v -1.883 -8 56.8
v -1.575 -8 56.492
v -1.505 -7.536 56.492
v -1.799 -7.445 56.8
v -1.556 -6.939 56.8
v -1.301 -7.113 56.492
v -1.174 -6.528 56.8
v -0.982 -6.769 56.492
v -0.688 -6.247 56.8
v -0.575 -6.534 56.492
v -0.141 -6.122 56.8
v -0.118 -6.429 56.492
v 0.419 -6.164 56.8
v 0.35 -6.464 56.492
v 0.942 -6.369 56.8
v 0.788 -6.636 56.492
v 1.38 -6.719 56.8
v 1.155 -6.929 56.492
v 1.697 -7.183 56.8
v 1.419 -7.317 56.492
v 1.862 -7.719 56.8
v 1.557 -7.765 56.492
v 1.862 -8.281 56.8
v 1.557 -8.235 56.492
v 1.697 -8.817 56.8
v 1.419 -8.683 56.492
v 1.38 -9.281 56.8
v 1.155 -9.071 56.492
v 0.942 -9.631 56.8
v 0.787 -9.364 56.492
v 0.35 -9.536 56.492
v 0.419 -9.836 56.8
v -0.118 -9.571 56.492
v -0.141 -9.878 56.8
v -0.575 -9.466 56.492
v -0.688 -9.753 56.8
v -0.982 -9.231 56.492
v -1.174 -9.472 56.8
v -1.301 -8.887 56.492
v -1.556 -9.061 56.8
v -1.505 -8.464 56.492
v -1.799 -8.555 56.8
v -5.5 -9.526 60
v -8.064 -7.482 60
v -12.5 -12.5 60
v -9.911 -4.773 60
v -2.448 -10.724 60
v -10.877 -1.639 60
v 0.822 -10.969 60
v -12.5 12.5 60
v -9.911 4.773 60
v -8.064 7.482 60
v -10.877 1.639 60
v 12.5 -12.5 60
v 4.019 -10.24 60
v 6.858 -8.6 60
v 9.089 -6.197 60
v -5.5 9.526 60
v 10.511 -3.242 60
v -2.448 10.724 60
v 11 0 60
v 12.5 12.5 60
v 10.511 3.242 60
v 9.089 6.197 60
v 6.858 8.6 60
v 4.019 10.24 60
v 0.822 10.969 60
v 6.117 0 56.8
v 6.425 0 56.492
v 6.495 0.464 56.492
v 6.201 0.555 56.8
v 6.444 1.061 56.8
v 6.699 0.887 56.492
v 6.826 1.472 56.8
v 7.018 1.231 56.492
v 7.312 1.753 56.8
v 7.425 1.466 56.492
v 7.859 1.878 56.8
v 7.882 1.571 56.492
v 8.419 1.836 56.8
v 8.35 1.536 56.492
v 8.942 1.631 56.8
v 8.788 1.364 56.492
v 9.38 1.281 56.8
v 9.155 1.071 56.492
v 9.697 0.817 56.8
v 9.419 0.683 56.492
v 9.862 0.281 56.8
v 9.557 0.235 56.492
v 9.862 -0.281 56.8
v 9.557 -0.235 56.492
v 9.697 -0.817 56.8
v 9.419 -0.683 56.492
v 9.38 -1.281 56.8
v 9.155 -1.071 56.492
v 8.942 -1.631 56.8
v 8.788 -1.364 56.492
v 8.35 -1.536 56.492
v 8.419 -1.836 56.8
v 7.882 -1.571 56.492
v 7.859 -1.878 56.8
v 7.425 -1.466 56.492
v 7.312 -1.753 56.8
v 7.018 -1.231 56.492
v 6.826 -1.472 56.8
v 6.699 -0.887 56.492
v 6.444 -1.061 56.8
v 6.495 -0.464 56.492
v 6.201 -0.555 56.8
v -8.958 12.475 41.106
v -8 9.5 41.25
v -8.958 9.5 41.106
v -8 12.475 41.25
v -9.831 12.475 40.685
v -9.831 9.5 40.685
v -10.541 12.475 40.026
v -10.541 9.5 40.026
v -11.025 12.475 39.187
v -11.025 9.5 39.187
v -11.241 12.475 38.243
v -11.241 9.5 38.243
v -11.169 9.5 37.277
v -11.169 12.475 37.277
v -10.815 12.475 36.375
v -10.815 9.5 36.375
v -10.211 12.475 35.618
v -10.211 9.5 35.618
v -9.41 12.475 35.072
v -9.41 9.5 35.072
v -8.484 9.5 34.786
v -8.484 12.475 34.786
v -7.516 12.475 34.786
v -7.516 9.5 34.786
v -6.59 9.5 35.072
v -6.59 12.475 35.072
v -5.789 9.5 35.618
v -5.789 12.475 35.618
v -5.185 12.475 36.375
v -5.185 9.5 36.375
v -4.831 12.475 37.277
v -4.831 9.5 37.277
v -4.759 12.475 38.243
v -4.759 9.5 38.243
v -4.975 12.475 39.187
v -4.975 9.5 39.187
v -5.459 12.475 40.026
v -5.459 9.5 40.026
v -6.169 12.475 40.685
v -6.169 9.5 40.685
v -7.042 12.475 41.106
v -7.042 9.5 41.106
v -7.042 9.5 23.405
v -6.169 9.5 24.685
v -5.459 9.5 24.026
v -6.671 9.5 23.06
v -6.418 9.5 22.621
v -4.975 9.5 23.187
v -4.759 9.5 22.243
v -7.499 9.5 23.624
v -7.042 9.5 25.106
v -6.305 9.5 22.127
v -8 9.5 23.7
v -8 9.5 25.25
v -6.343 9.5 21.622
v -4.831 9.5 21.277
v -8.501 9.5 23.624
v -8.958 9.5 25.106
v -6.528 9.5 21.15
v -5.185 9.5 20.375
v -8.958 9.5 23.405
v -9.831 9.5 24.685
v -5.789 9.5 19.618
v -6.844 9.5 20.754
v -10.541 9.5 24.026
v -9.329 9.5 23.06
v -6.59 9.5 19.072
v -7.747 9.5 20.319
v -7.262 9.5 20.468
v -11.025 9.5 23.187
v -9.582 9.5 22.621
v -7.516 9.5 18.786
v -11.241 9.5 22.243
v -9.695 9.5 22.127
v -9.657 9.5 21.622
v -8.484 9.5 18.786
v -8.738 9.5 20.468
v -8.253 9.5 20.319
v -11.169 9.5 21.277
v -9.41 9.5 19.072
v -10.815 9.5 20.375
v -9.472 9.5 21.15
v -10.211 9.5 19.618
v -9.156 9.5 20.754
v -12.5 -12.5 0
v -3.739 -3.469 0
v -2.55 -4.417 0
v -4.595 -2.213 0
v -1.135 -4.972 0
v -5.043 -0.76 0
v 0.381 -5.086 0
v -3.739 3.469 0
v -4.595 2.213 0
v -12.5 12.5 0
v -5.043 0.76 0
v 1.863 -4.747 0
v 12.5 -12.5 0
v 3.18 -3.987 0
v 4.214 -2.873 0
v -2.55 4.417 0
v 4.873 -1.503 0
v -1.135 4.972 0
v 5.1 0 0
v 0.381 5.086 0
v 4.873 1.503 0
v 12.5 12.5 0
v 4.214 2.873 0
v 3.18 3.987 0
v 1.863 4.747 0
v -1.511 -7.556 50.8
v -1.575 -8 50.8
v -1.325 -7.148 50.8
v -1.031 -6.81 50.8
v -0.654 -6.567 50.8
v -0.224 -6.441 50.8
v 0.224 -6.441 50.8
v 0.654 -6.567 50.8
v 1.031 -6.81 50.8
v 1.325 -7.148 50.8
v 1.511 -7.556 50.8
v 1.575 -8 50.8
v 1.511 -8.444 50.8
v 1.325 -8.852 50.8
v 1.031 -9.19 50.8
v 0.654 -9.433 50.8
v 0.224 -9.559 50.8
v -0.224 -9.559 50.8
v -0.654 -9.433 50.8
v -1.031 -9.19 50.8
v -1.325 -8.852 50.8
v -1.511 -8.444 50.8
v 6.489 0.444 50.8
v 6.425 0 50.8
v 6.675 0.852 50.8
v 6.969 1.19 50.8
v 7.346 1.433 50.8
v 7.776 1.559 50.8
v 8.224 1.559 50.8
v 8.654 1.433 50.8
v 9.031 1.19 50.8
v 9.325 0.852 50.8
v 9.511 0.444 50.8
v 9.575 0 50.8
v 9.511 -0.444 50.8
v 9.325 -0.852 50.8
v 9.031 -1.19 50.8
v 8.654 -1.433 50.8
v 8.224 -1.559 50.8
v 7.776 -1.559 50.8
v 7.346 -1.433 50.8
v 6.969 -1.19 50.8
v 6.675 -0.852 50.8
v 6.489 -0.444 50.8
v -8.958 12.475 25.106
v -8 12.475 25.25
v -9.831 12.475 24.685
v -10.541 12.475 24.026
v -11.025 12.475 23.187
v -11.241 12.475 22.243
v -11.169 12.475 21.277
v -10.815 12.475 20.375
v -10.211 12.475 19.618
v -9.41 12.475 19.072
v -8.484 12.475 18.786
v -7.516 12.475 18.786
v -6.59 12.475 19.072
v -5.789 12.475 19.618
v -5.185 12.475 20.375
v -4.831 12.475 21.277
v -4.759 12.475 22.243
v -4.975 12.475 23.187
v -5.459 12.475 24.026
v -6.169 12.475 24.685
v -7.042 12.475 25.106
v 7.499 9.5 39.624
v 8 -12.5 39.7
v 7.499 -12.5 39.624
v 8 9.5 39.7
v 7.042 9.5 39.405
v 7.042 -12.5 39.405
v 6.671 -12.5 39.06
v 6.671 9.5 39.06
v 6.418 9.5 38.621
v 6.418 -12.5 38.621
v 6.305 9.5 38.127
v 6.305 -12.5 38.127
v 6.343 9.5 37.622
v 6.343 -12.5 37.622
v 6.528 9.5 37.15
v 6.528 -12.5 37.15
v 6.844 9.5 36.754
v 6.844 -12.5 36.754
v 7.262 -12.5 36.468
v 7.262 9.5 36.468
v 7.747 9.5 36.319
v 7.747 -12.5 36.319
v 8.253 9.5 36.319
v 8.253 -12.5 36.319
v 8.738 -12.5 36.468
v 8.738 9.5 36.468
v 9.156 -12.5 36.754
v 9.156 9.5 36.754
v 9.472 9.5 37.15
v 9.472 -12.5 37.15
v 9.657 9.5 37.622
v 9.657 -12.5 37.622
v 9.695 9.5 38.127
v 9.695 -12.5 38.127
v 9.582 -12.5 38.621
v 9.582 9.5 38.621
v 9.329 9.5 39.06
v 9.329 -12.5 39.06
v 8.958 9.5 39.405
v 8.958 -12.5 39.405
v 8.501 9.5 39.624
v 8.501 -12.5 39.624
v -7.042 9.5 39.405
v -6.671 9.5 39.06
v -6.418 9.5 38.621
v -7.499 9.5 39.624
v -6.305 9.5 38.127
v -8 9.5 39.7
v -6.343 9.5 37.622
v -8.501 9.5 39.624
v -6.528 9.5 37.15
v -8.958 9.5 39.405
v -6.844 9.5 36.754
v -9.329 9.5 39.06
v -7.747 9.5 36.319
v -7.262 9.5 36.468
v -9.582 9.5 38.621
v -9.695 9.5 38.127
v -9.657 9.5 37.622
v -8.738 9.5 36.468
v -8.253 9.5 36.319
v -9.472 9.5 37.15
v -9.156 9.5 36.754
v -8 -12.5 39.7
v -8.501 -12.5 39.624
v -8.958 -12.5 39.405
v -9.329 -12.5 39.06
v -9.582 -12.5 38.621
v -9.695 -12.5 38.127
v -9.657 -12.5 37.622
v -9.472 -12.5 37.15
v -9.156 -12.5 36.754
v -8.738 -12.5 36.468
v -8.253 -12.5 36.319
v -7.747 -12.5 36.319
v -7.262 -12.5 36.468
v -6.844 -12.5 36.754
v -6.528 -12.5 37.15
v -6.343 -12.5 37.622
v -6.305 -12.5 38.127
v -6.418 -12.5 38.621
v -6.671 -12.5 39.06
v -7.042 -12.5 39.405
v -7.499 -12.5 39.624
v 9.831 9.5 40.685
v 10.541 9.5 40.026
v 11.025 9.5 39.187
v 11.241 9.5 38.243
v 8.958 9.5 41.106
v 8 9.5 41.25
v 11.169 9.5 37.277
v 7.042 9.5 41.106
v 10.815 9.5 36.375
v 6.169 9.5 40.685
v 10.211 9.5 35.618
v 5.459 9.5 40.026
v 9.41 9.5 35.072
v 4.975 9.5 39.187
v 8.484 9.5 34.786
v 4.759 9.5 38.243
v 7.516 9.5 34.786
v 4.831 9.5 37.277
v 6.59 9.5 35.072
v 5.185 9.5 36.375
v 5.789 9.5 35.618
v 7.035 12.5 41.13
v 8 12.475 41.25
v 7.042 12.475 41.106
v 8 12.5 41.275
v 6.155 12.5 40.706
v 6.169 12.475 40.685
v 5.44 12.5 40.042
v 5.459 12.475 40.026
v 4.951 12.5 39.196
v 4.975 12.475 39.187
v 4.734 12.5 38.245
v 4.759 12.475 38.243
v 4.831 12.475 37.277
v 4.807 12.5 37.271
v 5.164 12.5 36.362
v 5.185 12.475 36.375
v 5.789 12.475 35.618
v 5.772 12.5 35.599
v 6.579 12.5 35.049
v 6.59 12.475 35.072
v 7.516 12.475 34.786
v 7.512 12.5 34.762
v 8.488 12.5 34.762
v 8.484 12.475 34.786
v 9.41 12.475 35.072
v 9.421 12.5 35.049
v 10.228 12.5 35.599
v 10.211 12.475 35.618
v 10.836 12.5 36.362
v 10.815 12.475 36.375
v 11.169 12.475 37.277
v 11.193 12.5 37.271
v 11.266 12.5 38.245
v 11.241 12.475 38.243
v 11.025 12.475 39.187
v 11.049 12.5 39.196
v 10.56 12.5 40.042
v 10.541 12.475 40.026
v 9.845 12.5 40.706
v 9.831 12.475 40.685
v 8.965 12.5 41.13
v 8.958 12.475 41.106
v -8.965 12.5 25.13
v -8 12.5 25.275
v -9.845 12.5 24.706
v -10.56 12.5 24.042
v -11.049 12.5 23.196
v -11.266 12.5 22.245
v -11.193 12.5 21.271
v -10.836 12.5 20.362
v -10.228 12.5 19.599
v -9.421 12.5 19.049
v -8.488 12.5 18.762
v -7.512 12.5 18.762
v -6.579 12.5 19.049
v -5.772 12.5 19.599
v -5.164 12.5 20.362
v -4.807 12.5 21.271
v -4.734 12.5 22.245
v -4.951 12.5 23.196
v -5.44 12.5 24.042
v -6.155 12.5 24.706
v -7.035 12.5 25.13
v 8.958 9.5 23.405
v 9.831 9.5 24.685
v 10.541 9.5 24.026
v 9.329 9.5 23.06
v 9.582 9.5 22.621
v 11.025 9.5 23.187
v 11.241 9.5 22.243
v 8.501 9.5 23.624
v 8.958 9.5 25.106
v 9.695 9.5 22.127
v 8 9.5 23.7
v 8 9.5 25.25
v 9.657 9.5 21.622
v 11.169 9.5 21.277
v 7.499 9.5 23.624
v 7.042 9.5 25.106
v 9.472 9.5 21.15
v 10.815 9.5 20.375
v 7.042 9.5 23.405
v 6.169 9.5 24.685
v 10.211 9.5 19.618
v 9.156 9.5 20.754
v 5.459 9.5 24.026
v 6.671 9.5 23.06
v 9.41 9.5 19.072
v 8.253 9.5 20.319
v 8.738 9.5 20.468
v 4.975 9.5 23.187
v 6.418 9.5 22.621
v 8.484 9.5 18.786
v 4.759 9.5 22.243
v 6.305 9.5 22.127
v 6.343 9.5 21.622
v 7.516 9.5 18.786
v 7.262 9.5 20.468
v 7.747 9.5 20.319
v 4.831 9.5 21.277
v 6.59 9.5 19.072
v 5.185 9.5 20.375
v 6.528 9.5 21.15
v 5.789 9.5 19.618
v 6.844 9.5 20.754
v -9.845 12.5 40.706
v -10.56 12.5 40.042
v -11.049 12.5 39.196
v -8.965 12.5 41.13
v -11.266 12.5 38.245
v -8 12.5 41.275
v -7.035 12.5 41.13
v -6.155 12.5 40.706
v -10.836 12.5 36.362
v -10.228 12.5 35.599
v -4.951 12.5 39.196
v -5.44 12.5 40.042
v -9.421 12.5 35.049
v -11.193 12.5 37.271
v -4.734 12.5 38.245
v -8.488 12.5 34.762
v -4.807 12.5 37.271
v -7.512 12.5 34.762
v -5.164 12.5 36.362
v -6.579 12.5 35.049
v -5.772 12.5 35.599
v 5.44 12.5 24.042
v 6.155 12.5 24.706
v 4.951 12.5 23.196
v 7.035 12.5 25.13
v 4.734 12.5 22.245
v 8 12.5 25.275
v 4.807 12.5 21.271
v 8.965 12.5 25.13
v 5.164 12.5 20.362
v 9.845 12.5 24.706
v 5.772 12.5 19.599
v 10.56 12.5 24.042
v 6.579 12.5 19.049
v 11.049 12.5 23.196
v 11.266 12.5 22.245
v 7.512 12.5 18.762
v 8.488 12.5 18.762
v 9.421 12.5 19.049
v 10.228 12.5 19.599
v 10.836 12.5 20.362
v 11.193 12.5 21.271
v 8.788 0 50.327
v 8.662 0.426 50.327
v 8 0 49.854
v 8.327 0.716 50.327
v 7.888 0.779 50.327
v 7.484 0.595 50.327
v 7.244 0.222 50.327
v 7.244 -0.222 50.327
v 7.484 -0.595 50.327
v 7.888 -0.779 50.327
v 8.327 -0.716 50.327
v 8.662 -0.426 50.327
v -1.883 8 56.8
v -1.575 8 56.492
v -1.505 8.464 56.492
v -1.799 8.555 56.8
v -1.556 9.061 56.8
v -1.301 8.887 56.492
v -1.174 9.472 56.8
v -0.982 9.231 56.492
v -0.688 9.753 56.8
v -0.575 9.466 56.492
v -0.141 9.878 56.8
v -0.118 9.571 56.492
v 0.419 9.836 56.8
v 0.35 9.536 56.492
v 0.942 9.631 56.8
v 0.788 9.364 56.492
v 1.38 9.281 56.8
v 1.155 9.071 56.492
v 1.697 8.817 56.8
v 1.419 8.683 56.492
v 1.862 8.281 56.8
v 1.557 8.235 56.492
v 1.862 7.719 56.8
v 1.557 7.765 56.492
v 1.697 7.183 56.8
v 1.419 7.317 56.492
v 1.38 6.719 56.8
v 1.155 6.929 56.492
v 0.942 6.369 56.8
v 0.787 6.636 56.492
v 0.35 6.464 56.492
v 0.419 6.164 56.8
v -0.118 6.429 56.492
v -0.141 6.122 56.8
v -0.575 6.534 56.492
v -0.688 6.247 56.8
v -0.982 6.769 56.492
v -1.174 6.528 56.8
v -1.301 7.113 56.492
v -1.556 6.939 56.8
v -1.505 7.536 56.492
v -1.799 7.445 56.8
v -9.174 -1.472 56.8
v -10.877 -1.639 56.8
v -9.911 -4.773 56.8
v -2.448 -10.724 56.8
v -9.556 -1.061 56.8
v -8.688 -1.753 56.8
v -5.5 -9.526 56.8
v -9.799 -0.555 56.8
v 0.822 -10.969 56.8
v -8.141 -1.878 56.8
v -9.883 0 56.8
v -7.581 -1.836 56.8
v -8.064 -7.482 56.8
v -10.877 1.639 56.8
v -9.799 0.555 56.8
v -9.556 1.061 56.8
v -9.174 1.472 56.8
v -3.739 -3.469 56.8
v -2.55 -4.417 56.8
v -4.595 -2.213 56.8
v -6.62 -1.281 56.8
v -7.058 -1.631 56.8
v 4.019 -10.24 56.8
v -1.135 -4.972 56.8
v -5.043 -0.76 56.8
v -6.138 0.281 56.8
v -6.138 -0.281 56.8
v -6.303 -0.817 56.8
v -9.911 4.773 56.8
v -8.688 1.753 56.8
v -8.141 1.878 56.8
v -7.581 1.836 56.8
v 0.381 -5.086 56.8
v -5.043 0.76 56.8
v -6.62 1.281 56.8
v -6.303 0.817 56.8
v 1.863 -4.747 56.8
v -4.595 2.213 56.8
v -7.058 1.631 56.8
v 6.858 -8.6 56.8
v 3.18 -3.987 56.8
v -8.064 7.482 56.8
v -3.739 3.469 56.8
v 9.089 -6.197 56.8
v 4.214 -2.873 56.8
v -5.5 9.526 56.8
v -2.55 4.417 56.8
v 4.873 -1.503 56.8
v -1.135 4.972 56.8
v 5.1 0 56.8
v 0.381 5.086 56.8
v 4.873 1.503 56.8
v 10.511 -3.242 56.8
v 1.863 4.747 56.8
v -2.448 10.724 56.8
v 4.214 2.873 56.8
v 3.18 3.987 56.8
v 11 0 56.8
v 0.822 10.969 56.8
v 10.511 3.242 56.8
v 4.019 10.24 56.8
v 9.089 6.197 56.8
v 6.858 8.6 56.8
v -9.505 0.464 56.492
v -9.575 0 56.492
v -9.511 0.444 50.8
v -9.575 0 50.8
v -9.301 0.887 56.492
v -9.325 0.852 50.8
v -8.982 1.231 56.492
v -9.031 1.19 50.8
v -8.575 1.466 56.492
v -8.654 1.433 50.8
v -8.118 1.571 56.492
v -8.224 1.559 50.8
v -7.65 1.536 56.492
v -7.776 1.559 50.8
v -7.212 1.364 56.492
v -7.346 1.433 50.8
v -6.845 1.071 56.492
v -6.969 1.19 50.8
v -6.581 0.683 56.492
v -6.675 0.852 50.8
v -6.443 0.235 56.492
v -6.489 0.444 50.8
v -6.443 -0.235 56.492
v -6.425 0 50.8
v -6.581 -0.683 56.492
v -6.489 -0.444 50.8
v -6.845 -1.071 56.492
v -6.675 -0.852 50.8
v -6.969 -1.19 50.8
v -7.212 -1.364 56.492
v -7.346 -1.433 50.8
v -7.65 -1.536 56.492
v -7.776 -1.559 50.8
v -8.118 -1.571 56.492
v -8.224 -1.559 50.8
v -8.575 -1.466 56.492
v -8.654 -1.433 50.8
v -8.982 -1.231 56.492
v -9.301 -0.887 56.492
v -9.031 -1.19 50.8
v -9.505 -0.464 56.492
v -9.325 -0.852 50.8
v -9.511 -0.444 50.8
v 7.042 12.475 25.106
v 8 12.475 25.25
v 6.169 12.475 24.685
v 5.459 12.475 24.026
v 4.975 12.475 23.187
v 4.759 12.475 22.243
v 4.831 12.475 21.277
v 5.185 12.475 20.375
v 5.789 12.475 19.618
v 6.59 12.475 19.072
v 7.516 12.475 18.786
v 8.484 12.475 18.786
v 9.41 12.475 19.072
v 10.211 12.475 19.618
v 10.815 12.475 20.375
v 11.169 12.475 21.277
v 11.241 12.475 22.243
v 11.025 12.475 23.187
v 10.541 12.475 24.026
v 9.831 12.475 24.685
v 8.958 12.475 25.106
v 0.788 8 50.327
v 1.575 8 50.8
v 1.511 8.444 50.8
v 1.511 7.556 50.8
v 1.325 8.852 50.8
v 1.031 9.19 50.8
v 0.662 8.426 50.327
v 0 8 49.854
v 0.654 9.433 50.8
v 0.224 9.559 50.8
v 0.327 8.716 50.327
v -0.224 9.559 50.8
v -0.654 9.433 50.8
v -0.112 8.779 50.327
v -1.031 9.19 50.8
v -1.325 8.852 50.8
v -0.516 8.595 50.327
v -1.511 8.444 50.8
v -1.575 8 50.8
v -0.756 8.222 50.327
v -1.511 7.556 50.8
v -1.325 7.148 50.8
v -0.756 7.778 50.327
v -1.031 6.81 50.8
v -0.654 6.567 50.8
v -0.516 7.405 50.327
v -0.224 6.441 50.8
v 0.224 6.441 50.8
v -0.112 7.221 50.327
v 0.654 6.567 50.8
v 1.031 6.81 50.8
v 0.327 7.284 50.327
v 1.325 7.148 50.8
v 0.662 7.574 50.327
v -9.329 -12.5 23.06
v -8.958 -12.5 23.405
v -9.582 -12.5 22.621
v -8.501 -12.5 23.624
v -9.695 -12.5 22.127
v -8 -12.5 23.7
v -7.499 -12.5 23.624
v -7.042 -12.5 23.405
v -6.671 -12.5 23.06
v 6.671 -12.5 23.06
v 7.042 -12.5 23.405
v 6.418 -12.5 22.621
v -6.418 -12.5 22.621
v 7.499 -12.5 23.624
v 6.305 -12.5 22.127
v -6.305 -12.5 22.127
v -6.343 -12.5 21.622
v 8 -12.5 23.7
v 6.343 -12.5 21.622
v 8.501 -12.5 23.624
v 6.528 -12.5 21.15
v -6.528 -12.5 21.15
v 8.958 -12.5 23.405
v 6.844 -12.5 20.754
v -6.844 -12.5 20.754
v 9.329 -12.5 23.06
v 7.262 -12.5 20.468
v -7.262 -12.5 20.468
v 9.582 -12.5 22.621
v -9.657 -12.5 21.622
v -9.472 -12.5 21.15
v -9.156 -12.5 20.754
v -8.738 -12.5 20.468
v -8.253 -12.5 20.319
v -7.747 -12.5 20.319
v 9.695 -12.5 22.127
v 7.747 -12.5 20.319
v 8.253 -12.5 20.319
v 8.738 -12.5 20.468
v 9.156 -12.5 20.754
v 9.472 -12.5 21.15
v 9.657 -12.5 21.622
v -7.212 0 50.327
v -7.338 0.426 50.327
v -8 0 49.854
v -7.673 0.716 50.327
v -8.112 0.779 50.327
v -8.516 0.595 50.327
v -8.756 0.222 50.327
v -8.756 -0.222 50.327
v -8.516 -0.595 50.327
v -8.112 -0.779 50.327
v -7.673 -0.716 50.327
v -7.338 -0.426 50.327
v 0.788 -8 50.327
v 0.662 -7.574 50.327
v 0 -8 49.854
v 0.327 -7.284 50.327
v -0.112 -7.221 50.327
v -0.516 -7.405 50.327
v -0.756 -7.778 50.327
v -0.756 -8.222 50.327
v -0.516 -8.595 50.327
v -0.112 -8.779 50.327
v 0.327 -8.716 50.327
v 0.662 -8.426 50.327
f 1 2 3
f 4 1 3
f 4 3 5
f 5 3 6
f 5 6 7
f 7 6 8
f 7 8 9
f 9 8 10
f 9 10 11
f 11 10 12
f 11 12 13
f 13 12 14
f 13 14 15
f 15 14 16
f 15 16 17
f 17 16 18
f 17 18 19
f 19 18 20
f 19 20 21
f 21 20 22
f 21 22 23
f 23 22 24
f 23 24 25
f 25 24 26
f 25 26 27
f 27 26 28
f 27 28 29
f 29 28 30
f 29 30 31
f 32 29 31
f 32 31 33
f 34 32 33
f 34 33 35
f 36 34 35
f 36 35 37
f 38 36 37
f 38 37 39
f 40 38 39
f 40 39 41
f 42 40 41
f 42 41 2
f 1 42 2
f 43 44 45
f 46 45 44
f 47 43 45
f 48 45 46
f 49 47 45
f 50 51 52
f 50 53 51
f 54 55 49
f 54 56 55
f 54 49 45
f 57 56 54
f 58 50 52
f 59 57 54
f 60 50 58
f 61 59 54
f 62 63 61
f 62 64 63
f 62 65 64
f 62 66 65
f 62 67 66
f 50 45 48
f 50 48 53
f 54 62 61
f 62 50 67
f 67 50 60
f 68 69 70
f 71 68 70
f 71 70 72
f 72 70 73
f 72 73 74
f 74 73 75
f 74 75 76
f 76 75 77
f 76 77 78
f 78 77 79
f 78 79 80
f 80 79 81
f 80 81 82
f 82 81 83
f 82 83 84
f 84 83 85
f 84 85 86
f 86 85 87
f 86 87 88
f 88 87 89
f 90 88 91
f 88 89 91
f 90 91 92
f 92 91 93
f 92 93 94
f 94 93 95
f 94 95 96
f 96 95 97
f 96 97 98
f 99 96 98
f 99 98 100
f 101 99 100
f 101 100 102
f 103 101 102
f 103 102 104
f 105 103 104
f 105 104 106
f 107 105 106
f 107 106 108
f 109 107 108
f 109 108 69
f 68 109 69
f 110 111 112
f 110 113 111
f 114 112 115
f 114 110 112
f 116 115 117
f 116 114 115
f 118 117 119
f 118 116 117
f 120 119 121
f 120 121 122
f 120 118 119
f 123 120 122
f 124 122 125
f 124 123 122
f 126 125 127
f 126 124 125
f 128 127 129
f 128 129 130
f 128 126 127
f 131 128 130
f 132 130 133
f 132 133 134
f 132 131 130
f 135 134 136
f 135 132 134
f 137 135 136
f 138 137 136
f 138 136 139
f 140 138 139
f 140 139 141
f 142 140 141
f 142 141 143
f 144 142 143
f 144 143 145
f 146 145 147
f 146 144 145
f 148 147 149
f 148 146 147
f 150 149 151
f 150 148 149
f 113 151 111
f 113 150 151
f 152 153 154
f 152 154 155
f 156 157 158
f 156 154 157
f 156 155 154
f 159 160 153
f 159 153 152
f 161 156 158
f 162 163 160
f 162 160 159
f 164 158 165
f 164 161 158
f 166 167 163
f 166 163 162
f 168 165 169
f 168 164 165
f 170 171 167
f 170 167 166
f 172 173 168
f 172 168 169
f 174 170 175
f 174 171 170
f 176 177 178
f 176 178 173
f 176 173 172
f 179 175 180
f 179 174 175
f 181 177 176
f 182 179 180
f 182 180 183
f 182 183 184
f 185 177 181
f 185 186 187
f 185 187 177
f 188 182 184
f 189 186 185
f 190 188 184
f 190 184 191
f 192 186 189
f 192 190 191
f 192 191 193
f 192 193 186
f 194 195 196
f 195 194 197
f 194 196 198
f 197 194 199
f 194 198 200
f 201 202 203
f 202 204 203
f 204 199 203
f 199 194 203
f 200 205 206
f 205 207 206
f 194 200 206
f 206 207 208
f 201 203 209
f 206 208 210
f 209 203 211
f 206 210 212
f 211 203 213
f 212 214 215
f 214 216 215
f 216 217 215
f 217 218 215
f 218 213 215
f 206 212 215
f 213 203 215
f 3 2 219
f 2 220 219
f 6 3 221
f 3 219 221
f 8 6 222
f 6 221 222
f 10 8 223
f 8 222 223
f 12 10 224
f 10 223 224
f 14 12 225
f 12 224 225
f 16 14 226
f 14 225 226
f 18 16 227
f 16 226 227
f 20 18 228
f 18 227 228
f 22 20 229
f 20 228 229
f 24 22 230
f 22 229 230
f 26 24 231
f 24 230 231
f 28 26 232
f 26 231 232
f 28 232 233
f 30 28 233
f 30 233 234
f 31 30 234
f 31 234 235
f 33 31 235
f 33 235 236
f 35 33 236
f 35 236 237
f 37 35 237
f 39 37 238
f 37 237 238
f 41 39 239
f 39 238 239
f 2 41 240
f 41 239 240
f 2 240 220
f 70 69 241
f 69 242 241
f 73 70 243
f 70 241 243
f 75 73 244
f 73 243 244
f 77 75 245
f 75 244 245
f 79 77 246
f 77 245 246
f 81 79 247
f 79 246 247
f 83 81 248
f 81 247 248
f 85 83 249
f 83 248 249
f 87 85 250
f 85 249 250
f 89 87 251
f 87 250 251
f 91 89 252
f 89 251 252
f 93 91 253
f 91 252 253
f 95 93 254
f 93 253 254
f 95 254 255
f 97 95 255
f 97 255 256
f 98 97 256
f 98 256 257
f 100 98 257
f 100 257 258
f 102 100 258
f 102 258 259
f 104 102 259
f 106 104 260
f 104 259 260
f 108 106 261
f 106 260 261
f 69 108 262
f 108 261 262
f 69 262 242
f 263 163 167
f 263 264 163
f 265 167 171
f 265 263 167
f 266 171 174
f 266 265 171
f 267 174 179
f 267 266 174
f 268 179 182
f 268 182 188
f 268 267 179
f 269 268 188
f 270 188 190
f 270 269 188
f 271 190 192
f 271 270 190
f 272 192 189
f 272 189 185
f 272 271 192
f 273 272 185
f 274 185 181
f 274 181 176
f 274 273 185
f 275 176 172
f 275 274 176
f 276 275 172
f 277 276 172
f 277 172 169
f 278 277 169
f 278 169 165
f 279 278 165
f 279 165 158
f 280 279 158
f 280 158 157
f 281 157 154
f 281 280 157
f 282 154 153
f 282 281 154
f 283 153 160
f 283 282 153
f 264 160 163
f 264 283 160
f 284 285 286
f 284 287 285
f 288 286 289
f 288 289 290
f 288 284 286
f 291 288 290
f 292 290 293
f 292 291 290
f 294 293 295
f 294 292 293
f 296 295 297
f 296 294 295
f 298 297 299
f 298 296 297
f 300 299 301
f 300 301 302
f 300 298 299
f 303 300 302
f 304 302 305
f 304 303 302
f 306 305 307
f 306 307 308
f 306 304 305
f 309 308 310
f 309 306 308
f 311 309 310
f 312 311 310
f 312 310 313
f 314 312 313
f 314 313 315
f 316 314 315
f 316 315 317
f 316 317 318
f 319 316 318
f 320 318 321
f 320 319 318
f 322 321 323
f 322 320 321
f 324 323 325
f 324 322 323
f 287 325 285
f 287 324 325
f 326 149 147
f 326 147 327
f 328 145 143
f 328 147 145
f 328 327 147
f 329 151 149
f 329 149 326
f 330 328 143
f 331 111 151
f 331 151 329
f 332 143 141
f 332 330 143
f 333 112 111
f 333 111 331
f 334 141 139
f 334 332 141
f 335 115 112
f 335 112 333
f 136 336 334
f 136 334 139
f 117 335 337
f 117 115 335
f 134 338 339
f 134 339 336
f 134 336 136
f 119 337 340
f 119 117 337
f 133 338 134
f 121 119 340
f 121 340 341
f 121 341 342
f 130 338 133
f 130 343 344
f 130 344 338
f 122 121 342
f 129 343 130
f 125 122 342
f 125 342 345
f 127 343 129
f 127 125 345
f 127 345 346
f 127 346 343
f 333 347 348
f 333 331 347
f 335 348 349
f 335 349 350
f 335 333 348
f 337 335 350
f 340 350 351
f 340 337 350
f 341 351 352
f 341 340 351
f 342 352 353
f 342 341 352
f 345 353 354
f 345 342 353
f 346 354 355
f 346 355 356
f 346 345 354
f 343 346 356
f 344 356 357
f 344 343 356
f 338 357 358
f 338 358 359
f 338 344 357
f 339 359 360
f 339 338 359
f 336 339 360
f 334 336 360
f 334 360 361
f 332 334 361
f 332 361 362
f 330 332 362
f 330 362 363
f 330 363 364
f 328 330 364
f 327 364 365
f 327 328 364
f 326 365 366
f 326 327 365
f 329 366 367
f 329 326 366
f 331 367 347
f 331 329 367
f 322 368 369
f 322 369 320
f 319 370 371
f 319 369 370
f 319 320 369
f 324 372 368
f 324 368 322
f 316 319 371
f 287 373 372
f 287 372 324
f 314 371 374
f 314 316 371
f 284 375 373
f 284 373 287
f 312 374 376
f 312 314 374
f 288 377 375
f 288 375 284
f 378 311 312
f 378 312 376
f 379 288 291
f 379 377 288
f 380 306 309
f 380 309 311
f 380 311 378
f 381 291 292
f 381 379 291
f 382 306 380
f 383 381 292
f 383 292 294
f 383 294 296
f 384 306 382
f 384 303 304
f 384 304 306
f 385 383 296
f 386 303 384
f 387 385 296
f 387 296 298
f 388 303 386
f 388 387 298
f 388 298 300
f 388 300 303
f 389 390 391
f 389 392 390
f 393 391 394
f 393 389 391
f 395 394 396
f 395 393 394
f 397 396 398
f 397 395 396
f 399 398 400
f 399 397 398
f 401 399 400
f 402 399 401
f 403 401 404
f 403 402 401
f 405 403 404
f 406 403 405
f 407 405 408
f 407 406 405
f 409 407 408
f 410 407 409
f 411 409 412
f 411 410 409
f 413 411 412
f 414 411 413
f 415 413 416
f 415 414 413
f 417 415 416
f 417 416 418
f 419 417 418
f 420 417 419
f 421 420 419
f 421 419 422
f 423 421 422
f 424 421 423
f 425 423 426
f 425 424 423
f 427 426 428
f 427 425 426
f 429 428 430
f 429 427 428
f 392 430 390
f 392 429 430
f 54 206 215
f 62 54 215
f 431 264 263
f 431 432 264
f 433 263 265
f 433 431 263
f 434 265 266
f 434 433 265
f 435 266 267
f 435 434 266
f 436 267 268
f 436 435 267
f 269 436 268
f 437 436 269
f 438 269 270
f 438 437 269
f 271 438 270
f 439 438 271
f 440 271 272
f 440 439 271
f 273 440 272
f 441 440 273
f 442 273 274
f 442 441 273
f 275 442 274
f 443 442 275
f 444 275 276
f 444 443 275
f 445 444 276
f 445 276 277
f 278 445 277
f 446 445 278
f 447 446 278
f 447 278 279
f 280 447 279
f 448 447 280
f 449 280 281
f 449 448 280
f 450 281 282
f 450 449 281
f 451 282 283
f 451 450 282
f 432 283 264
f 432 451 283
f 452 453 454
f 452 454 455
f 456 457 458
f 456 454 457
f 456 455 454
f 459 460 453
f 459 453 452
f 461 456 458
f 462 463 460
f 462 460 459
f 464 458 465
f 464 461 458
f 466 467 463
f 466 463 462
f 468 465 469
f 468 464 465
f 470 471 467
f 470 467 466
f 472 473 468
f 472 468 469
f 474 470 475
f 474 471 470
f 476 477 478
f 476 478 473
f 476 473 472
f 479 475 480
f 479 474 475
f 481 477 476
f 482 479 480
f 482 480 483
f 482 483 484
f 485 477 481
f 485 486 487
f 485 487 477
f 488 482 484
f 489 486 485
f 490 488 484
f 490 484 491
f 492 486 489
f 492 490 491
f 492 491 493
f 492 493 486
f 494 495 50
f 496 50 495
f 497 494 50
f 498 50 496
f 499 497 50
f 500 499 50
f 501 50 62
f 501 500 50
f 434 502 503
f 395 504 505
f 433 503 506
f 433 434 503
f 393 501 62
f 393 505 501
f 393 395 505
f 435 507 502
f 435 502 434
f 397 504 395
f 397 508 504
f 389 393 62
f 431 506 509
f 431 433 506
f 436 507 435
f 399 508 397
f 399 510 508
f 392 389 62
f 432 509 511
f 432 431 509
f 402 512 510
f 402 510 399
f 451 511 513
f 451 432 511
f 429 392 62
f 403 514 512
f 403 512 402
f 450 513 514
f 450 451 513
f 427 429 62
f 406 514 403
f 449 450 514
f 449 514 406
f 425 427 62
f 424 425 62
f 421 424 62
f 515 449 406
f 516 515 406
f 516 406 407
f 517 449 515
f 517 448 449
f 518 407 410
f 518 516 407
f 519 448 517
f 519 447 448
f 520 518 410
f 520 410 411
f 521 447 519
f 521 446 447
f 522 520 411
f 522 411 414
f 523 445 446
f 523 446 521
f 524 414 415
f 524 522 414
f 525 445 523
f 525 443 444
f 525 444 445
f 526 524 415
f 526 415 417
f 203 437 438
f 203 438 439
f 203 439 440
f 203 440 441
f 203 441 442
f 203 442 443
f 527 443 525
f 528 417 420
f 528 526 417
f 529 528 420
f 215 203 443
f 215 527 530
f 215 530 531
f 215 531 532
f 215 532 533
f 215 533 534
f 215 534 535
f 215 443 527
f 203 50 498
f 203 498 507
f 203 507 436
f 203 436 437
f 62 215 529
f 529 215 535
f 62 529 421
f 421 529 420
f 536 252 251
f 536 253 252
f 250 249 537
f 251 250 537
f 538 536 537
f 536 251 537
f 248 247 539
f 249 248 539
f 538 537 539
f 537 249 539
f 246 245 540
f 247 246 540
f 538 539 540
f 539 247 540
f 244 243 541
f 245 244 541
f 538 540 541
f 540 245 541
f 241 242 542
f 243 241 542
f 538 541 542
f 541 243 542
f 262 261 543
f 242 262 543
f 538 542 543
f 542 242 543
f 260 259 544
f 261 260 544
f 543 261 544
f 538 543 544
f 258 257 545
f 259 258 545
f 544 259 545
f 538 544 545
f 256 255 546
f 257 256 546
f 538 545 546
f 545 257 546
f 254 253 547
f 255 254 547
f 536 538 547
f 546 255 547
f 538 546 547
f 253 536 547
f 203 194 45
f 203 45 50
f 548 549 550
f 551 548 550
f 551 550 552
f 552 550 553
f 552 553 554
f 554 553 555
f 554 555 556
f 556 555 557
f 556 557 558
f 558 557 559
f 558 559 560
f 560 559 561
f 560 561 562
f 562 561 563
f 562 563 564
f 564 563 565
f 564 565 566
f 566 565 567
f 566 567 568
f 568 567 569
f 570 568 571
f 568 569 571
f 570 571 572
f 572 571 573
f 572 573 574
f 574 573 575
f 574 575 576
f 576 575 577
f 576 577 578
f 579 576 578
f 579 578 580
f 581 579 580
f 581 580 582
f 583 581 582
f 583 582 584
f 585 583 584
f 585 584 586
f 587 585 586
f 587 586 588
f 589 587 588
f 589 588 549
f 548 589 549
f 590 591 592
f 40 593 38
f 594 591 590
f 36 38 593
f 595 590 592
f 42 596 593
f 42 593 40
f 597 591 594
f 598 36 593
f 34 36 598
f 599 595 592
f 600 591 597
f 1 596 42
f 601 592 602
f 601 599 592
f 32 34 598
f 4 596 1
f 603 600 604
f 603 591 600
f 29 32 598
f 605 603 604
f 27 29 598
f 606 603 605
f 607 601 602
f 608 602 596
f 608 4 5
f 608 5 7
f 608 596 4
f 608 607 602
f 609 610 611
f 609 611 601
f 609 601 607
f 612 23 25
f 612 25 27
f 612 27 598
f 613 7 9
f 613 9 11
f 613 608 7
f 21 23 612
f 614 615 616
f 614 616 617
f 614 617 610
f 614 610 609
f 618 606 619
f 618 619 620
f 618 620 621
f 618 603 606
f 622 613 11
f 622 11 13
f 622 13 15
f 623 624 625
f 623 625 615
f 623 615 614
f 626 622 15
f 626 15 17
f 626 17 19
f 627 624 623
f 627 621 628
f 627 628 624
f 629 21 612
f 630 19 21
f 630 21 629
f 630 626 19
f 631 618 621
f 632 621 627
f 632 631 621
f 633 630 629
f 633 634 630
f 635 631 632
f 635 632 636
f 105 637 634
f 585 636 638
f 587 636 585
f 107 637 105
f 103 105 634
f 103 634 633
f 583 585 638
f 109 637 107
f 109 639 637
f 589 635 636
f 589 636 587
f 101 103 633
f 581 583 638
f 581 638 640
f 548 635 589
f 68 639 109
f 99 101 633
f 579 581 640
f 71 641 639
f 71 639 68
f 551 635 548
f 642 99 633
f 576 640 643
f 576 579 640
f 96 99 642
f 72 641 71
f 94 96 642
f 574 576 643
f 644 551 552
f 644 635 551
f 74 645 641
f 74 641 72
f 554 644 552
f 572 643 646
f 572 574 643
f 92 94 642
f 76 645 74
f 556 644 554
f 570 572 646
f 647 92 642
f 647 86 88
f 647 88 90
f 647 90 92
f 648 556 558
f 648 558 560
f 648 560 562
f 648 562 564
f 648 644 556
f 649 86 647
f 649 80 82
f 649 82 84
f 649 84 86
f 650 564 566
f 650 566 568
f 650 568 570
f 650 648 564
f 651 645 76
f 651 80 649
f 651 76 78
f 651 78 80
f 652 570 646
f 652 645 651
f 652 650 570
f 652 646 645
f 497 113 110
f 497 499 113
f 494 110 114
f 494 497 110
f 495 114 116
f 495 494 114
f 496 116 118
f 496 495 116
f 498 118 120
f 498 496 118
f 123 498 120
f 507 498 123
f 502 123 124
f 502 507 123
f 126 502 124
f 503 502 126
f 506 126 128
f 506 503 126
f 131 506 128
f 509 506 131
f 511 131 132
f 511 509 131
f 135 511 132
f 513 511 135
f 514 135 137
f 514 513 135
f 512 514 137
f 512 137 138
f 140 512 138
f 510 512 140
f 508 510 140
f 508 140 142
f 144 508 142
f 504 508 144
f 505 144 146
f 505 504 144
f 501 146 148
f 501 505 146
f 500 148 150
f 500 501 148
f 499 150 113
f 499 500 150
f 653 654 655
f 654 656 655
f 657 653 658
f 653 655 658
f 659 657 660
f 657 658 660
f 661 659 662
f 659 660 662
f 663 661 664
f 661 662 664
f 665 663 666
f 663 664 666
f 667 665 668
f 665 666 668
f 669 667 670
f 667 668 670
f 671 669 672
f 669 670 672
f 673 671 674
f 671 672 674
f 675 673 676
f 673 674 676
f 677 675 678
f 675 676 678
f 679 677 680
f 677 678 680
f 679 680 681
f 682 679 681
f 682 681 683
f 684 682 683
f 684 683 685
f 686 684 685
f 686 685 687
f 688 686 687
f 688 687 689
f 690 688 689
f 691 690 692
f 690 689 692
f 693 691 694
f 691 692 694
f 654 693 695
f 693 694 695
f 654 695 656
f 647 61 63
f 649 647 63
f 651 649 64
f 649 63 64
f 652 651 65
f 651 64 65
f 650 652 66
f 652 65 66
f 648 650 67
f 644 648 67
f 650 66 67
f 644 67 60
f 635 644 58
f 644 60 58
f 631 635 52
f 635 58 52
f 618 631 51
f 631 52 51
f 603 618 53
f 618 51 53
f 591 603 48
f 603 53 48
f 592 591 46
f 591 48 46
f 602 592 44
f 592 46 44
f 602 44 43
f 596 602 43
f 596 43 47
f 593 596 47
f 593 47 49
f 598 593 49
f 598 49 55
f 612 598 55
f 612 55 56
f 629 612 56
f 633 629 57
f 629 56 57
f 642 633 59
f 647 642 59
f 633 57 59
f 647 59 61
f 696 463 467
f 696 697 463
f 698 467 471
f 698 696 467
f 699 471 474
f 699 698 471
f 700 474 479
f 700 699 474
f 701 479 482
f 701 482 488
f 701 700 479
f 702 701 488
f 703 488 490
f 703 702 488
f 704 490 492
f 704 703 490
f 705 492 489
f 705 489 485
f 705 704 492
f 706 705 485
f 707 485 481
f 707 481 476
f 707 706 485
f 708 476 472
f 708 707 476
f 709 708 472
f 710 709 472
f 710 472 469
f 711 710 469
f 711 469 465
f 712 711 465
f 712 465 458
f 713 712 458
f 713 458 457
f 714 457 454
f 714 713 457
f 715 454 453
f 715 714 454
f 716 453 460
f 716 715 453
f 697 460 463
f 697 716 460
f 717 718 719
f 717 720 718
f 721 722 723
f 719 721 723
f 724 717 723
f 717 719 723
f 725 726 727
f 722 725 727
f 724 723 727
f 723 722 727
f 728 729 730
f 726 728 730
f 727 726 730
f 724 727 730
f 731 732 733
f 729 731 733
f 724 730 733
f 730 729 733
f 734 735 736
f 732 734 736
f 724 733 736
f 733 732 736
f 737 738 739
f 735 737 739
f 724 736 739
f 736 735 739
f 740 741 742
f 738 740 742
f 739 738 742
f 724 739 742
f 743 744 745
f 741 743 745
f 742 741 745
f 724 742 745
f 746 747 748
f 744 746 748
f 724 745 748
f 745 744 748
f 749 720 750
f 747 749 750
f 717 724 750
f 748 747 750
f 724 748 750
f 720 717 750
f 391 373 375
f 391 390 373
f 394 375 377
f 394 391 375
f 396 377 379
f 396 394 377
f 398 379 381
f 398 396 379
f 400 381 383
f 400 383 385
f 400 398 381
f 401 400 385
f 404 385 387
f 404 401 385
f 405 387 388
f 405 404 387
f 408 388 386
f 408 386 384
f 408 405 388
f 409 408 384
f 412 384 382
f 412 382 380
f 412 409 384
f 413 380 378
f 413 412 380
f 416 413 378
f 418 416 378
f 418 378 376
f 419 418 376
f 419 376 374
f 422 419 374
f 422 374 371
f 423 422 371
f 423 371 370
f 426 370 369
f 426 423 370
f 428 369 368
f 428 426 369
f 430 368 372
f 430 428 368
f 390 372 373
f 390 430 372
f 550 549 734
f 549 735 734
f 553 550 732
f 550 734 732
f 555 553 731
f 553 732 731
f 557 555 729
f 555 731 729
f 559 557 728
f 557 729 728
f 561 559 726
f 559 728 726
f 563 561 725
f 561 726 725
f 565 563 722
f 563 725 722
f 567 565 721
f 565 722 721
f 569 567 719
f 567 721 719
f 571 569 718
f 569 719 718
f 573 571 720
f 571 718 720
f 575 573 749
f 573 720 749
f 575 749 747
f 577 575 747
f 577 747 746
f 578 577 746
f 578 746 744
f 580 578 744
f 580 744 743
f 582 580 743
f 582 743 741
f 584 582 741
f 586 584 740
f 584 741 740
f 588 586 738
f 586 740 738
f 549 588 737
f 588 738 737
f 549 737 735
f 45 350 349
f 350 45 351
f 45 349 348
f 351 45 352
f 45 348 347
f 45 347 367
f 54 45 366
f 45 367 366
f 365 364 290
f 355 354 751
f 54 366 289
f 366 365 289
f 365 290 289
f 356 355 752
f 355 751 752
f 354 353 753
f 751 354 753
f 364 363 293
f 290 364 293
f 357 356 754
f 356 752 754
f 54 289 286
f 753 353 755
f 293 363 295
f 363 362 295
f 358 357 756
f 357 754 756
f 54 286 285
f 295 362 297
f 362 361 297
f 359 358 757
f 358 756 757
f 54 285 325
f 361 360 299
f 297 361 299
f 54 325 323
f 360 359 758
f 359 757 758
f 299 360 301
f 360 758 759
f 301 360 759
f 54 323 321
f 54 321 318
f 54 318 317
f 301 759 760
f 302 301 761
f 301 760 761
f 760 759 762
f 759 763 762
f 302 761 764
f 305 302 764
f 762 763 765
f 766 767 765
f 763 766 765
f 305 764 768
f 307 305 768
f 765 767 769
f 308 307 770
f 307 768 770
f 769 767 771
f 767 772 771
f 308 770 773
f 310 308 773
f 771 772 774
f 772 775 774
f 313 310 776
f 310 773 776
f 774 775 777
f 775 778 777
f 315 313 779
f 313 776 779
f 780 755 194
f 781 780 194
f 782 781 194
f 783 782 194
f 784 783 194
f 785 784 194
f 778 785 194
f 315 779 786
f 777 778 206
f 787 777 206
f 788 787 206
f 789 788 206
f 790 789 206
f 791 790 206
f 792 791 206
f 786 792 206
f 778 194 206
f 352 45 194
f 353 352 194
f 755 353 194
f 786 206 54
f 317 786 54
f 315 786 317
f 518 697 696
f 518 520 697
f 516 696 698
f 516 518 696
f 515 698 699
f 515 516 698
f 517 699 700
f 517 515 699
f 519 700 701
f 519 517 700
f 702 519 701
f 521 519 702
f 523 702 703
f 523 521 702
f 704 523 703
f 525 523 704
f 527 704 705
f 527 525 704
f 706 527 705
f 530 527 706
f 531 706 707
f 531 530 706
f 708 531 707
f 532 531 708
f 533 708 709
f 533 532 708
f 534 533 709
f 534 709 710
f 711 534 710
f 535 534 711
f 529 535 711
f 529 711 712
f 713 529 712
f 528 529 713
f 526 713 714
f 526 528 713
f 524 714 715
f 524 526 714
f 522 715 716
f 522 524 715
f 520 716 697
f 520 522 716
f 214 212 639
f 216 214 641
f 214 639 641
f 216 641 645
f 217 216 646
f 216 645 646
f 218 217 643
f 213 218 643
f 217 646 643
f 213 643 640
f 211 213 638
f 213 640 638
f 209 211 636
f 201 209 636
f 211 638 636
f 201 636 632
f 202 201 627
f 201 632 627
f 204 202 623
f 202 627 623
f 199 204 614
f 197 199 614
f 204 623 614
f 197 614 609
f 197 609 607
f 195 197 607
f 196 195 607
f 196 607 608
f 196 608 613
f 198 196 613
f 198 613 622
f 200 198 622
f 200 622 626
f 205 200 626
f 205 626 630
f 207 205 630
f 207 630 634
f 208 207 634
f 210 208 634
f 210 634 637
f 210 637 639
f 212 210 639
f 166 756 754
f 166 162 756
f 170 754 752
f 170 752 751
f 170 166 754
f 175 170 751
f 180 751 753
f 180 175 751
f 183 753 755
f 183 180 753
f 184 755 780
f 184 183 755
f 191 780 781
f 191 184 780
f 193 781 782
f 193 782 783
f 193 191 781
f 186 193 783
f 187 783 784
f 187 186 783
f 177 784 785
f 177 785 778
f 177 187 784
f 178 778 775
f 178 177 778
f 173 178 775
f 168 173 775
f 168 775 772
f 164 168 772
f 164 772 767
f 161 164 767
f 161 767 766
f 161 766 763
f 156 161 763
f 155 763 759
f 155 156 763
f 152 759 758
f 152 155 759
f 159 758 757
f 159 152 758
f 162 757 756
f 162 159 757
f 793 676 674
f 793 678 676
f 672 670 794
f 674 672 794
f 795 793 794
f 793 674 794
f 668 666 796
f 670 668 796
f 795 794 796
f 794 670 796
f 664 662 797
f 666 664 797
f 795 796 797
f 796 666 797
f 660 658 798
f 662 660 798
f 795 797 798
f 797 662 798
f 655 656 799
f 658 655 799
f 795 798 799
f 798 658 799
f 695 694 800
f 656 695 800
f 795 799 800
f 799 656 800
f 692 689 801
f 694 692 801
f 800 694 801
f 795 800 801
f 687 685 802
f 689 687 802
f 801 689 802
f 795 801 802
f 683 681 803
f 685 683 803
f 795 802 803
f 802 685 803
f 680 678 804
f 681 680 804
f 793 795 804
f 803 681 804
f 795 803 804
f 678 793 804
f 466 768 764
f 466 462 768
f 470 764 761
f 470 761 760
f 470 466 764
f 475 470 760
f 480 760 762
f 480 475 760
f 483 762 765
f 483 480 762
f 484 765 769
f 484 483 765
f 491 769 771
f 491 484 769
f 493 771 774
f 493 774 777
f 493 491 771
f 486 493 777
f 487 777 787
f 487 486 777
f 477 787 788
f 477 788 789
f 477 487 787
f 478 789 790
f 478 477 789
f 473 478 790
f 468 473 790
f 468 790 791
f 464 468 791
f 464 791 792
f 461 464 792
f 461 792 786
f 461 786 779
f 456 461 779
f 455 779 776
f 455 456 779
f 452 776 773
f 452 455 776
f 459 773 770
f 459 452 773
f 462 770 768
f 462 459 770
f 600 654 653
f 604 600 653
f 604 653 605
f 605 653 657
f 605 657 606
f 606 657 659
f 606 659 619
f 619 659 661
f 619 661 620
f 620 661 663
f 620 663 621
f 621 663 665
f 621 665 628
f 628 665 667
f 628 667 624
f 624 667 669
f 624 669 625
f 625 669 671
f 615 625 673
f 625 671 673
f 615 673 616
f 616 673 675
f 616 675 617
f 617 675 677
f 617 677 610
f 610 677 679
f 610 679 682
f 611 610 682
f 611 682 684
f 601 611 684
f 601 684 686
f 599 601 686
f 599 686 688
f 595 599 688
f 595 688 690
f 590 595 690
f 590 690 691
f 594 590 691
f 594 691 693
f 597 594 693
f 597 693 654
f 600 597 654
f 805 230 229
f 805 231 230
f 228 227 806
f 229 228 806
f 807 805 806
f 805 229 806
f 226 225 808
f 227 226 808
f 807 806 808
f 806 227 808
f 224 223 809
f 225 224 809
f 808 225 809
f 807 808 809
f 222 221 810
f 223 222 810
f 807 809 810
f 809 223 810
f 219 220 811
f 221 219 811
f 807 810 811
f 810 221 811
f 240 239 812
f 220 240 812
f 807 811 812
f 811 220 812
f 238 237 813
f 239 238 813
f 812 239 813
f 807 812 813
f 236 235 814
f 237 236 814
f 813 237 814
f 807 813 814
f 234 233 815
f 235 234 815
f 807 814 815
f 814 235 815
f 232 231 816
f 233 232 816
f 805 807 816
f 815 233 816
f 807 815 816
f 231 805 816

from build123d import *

# Parameters (mm, degrees)
ESBO_O1_W                                         = 25
ESBO_O1_H                                         = 25
RESSALTO_EXTRUS_O1_DEPTH                          = 60
ESBO_O2_R                                         = 5.1
CORTE_EXTRUS_O1_DEPTH                             = 61
ESBO_O3_R                                         = 11
CORTE_EXTRUS_O2_DEPTH                             = 3.2
FURO_ROSCADO_PARA_CONDU_TE_DE_M3X0_51_D           = 3.15
FURO_ROSCADO_PARA_CONDU_TE_DE_M3X0_51_DEPTH       = 6
FURO_ROSCADO_PARA_CONDU_TE_DE_M3X0_51_CSINK_D     = 3.766
FURO_ROSCADO_PARA_CONDU_TE_DE_M3X0_51_CSINK_ANGLE = 90
FURO_ROSCADO_PARA_CONDU_TE_DE_M3X0_51_TIP         = 0.946355475
REBAIXO_PARA_SHCS_M31_AT_2_COUNT                  = 2
REBAIXO_PARA_SHCS_M31_AT_2_PITCH                  = 16
REBAIXO_PARA_SHCS_M31_AT_3_COUNT                  = 2
REBAIXO_PARA_SHCS_M31_AT_3_PITCH                  = 16
REBAIXO_PARA_SHCS_M31_AT_4_COUNT                  = 2
REBAIXO_PARA_SHCS_M31_AT_4_PITCH                  = 22.627416998


with BuildPart() as part:
    # Esboço1 → Ressalto-extrusão1 (new body)
    with BuildSketch(Plane.XY):
        Rectangle(ESBO_O1_W, ESBO_O1_H)
    extrude(amount=RESSALTO_EXTRUS_O1_DEPTH)

    # Esboço2 → Corte-extrusão1 (cut, through all)
    with BuildSketch(Plane.XY.offset(60)):
        Circle(ESBO_O2_R)
    extrude(amount=-CORTE_EXTRUS_O1_DEPTH, mode=Mode.SUBTRACT)

    # Esboço3 → Corte-extrusão2 (cut)
    with BuildSketch(Plane.XY.offset(60)):
        Circle(ESBO_O3_R)
    extrude(amount=-CORTE_EXTRUS_O2_DEPTH, mode=Mode.SUBTRACT)

    # Furo roscado para conduíte de M3x0.51
    with Locations(Plane.XY.offset(56.8)):
        with Locations((0, 8), (8, 0), (0, -8), (-8, 0)):
            CounterSinkHole(FURO_ROSCADO_PARA_CONDU_TE_DE_M3X0_51_D / 2, FURO_ROSCADO_PARA_CONDU_TE_DE_M3X0_51_CSINK_D / 2, depth=FURO_ROSCADO_PARA_CONDU_TE_DE_M3X0_51_DEPTH, counter_sink_angle=FURO_ROSCADO_PARA_CONDU_TE_DE_M3X0_51_CSINK_ANGLE)
            with Locations((0, 0, -(FURO_ROSCADO_PARA_CONDU_TE_DE_M3X0_51_DEPTH + FURO_ROSCADO_PARA_CONDU_TE_DE_M3X0_51_TIP / 2))):  # 118° drill point
                Cone(0, FURO_ROSCADO_PARA_CONDU_TE_DE_M3X0_51_D / 2, FURO_ROSCADO_PARA_CONDU_TE_DE_M3X0_51_TIP, mode=Mode.SUBTRACT)

    # Esboço7 → Rebaixo para SHCS M31 (revolve, cut)
    with BuildSketch(Plane(origin=(-8, 12.5, 22), x_dir=(0, 0, 1), z_dir=(1, 0, 0))):
        Polygon((0, 0), (0, 25), (1.7, 25), (1.7, 3), (3.25, 3), (3.25, 0.025), (3.275, 0), align=None)
    rebaixo_para_shcs_m31 = revolve(axis=Axis((-8, 18.85, 22), (0, -1, 0)), mode=Mode.SUBTRACT)

    # Rebaixo para SHCS M31 at 2: Rebaixo para SHCS M31 ×2
    with Locations(*[(i * REBAIXO_PARA_SHCS_M31_AT_2_PITCH, 0, 0) for i in range(1, REBAIXO_PARA_SHCS_M31_AT_2_COUNT)]):
        add(rebaixo_para_shcs_m31, mode=Mode.SUBTRACT)

    # Rebaixo para SHCS M31 at 3: Rebaixo para SHCS M31 ×2
    with Locations(*[(0, 0, i * REBAIXO_PARA_SHCS_M31_AT_3_PITCH) for i in range(1, REBAIXO_PARA_SHCS_M31_AT_3_COUNT)]):
        add(rebaixo_para_shcs_m31, mode=Mode.SUBTRACT)

    # Rebaixo para SHCS M31 at 4: Rebaixo para SHCS M31 ×2
    with Locations(*[Vector(0.707106781, 0, 0.707106781) * (i * REBAIXO_PARA_SHCS_M31_AT_4_PITCH) for i in range(1, REBAIXO_PARA_SHCS_M31_AT_4_COUNT)]):
        add(rebaixo_para_shcs_m31, mode=Mode.SUBTRACT)


solid = part.part
